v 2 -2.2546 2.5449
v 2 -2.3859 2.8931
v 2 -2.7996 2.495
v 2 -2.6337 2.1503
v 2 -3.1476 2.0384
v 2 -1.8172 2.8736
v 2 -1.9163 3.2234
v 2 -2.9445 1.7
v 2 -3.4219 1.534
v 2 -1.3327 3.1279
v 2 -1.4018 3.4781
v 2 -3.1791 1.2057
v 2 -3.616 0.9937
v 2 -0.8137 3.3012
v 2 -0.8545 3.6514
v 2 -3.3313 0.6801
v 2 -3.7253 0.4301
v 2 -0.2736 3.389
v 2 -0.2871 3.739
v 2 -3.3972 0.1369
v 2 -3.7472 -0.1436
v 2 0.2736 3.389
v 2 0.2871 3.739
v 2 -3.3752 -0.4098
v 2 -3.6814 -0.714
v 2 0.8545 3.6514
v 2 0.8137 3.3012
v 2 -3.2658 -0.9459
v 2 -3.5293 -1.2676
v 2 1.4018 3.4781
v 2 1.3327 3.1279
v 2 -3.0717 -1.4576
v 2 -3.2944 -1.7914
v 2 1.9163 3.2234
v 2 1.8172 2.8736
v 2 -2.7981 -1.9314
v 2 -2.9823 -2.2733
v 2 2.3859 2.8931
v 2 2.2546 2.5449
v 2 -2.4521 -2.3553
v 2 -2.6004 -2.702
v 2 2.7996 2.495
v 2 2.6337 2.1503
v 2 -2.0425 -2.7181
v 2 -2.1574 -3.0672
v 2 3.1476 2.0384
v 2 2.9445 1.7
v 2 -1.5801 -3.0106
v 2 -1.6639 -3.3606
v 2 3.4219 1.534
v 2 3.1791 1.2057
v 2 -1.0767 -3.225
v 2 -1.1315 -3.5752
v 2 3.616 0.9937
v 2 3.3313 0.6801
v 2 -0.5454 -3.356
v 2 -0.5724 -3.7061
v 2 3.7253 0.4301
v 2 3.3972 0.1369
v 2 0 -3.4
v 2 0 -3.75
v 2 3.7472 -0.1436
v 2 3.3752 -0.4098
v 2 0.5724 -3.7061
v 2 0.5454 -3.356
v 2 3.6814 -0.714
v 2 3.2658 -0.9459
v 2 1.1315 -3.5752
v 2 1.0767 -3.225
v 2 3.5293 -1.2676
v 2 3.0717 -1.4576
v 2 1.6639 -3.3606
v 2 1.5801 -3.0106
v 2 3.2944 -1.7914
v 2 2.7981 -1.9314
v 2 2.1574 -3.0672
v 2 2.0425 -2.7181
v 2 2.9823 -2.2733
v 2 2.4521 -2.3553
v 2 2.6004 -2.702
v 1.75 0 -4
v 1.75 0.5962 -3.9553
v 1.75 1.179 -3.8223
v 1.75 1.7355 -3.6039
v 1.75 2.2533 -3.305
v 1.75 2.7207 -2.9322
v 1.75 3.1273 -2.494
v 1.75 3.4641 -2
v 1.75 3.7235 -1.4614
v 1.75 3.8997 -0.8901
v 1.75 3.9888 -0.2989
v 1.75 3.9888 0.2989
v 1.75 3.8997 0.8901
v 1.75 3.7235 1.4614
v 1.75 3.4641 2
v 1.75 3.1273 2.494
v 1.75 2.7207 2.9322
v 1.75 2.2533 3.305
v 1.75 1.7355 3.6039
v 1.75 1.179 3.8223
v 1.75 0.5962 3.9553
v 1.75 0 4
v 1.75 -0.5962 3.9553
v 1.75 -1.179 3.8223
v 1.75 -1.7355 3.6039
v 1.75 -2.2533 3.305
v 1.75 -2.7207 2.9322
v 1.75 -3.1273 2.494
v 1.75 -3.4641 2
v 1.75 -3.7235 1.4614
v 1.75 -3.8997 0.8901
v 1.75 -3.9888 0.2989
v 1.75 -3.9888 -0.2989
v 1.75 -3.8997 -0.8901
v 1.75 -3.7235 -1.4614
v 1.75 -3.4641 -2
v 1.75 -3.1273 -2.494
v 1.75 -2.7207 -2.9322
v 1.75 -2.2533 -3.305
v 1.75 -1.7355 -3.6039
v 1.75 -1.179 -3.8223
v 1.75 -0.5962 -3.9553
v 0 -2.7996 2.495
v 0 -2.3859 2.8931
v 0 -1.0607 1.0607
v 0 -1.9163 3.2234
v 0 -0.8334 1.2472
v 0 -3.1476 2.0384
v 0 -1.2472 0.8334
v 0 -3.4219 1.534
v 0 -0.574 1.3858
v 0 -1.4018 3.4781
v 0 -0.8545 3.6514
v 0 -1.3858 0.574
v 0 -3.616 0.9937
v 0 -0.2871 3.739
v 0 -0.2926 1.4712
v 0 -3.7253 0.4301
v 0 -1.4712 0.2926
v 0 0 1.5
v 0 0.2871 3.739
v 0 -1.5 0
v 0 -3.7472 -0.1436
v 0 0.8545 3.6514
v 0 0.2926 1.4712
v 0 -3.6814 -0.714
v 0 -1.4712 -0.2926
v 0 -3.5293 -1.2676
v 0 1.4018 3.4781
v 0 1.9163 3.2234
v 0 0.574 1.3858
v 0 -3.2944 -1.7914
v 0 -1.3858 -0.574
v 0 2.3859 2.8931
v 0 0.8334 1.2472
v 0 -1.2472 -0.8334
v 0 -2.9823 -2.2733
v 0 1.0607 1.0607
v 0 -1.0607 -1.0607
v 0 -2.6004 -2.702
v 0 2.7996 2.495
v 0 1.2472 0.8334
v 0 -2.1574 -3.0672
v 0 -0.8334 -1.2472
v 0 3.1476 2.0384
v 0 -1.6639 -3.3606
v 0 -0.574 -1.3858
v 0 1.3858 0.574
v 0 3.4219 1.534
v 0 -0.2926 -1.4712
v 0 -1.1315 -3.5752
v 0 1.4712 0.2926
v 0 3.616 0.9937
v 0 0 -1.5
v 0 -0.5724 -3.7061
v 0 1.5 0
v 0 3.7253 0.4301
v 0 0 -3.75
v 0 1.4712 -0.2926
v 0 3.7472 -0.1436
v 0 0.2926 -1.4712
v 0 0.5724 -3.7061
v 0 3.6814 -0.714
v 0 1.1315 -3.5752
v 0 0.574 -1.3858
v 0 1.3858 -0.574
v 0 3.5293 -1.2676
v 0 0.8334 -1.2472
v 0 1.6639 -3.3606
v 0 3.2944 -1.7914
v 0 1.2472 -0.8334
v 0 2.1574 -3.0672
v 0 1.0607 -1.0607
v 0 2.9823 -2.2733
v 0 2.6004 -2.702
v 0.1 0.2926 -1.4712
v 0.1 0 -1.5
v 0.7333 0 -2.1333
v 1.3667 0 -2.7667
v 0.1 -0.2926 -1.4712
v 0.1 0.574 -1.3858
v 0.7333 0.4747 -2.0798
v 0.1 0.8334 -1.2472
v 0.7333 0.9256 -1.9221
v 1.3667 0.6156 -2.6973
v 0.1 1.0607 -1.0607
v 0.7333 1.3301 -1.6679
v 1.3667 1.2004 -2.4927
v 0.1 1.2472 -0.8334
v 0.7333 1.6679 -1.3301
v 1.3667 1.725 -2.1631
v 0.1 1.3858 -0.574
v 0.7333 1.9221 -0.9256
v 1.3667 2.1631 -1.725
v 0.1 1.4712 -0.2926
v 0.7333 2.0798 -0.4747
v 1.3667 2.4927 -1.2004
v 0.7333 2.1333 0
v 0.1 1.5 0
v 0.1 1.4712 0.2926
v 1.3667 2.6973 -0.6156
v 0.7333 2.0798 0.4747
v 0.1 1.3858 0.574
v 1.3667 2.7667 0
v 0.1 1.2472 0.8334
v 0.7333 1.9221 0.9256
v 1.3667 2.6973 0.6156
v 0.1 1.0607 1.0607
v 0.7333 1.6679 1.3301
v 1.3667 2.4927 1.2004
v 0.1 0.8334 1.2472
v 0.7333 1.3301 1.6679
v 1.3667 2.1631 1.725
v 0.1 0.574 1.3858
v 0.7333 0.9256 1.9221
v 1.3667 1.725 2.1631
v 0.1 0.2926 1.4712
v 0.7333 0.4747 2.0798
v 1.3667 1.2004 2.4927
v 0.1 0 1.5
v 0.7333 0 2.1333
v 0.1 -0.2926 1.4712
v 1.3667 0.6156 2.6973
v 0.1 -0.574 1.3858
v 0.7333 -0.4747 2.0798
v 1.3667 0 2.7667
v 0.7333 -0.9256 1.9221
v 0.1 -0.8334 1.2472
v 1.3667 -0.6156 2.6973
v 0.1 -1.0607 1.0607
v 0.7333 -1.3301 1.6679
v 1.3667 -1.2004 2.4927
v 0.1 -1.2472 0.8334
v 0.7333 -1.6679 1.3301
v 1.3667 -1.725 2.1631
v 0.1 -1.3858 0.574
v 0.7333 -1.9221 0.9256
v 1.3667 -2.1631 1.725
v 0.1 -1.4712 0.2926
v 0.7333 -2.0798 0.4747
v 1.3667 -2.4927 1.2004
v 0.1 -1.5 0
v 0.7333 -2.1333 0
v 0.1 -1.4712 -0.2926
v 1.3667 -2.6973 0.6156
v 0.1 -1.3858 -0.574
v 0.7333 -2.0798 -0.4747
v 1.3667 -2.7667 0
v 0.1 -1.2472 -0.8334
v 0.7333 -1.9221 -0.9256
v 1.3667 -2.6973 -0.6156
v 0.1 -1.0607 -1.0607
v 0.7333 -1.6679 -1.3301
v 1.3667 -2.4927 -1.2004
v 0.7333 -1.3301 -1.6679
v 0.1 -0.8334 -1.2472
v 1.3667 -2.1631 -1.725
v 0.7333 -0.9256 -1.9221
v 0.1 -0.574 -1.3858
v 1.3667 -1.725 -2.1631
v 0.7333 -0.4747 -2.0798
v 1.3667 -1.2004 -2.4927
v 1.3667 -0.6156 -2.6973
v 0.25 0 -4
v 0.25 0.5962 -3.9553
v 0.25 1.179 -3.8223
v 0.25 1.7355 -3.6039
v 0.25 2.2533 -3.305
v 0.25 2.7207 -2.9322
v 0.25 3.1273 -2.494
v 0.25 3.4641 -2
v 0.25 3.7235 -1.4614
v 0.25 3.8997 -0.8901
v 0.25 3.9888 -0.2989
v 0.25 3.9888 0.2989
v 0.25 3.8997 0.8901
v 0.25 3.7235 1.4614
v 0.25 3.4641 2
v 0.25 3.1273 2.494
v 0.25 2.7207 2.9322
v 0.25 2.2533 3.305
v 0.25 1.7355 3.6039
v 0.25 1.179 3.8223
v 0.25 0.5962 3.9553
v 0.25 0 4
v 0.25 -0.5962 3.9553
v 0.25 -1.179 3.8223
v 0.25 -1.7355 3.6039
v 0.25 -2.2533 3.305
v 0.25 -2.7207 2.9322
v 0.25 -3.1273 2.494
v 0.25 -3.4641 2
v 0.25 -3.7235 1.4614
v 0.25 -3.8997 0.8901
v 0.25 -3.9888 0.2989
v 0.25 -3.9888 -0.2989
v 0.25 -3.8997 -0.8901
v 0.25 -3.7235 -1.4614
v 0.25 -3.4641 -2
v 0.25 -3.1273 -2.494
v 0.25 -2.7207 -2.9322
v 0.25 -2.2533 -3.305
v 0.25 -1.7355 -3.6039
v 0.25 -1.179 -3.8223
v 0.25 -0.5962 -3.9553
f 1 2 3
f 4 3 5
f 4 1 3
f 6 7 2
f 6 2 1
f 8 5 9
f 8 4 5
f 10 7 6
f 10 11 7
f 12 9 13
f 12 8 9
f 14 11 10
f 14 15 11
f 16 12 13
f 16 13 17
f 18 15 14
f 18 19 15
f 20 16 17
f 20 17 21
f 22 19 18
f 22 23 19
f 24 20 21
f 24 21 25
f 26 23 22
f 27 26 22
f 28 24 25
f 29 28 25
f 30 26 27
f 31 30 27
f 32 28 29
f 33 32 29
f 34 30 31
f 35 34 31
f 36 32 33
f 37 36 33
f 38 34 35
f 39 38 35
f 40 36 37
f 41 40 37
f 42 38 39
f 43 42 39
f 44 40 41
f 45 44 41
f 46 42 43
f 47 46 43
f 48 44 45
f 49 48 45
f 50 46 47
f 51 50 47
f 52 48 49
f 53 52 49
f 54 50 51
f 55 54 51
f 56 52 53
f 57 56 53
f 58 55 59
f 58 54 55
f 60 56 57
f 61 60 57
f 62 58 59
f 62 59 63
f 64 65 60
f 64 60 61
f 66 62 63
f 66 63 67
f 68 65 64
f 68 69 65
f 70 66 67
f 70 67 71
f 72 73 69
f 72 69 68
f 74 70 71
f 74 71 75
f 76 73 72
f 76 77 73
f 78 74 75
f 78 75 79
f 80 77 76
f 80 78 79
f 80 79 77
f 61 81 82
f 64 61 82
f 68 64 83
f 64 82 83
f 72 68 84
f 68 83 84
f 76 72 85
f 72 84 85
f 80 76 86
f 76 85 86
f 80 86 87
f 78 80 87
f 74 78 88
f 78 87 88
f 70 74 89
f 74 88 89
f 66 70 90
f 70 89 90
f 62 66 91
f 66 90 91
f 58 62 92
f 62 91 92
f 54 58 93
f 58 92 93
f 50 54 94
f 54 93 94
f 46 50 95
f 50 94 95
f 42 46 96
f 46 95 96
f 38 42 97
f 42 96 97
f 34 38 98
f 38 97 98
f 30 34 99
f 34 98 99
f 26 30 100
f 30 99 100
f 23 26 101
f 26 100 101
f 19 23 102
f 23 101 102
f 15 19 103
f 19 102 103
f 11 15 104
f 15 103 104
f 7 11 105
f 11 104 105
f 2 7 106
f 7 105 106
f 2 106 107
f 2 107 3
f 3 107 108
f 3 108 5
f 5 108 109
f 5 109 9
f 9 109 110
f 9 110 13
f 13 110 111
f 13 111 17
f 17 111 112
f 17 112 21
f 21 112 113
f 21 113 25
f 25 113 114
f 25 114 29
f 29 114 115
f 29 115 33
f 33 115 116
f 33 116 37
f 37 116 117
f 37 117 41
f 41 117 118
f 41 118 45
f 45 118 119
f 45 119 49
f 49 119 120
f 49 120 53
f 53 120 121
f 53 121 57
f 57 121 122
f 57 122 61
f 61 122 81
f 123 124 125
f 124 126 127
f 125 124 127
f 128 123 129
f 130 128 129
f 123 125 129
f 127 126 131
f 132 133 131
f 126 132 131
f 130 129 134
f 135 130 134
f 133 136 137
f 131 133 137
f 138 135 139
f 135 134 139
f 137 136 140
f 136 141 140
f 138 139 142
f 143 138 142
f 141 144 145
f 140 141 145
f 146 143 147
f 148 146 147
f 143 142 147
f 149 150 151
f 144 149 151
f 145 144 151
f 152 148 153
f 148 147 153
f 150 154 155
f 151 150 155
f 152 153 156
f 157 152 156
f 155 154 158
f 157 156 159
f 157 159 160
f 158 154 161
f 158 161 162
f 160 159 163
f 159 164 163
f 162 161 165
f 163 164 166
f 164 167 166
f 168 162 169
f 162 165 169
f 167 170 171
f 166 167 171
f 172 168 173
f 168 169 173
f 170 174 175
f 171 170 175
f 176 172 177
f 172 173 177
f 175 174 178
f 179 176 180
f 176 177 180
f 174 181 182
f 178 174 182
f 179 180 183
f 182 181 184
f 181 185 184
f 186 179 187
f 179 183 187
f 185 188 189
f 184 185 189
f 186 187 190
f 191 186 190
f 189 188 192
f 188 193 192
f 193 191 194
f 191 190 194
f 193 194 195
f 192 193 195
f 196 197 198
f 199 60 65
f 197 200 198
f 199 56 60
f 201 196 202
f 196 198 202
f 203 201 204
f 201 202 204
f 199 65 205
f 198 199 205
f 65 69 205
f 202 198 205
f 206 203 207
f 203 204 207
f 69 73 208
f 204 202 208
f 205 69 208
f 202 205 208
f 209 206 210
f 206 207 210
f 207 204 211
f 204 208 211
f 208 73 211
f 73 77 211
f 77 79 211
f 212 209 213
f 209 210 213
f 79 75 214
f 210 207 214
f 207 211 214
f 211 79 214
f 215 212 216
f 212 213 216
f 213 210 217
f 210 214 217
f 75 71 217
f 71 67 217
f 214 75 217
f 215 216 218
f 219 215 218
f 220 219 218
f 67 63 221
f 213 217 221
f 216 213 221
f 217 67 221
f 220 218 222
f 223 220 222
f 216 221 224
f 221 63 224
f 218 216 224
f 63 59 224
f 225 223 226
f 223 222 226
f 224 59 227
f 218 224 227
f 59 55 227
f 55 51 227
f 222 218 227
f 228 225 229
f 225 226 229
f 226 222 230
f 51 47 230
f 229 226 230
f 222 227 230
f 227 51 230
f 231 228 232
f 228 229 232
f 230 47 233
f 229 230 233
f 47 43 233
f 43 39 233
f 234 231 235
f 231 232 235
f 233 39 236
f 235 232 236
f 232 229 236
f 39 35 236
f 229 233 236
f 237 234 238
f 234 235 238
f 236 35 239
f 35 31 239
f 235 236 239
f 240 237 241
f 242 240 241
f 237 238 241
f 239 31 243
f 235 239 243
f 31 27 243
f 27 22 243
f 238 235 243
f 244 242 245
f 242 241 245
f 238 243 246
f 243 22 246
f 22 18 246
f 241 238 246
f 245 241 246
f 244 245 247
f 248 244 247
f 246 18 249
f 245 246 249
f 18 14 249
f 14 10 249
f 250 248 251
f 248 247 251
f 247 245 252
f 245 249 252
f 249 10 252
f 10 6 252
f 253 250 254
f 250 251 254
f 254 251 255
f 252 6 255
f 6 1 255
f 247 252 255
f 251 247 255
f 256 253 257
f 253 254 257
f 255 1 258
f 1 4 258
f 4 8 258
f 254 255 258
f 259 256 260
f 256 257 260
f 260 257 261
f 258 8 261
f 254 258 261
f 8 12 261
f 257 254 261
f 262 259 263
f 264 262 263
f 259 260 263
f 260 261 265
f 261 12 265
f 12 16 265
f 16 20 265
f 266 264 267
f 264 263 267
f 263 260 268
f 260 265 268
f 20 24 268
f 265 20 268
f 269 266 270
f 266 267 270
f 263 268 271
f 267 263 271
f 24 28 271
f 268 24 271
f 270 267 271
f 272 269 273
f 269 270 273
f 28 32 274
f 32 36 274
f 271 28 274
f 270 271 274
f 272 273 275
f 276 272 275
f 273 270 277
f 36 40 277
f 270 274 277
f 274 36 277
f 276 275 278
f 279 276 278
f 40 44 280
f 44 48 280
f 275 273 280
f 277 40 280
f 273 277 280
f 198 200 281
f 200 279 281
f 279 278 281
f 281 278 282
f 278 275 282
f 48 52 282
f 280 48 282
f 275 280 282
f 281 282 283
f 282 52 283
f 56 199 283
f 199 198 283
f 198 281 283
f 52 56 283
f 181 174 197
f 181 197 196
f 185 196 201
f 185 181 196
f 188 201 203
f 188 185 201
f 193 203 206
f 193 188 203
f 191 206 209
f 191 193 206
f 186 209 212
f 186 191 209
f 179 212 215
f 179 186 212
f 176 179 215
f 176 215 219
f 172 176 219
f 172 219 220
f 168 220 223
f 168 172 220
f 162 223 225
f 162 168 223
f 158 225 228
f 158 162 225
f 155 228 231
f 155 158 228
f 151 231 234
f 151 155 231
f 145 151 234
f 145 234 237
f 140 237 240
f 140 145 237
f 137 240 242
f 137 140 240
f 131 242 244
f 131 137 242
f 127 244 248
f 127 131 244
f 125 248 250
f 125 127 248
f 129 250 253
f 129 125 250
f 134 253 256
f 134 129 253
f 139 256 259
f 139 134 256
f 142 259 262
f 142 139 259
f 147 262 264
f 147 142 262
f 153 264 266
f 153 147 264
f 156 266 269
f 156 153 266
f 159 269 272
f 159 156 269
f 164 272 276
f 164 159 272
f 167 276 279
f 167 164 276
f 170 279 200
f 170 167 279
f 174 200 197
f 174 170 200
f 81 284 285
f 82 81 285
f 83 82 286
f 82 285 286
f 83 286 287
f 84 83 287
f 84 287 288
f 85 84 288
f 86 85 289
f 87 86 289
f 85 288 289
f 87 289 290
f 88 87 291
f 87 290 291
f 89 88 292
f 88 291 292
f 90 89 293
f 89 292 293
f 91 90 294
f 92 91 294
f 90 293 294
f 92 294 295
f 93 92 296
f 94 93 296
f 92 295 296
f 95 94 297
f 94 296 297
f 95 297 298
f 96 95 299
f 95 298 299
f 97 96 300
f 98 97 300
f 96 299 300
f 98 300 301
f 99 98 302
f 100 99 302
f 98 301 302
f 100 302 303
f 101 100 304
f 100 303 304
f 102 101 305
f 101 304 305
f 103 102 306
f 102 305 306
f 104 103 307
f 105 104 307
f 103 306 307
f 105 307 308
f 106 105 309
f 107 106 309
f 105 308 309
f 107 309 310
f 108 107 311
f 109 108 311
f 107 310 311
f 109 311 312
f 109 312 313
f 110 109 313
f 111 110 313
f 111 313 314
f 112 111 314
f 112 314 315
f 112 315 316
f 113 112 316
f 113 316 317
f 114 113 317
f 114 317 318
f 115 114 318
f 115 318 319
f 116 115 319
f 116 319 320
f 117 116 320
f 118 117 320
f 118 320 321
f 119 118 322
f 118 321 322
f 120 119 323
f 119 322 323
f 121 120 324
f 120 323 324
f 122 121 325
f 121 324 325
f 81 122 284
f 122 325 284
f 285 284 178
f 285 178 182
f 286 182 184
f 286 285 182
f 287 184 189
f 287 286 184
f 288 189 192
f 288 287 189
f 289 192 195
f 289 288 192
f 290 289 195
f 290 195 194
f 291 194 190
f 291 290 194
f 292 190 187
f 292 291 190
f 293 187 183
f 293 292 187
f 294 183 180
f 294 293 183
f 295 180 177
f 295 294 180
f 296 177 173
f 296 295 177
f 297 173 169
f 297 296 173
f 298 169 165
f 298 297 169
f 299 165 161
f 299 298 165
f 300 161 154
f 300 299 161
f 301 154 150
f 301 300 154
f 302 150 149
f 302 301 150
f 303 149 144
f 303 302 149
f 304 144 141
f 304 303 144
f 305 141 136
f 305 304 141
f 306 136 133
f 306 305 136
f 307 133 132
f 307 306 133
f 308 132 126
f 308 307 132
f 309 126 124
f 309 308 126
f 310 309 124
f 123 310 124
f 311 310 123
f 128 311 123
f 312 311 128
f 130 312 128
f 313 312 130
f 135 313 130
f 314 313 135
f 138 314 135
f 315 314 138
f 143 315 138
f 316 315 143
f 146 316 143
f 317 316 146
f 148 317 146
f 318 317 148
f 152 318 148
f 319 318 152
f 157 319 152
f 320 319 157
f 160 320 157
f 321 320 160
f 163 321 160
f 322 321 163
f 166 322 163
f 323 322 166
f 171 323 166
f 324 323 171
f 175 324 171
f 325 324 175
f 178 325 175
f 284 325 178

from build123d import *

# Parameters (mm, degrees)
SKETCH1_R           = 4
SKETCH1_R_2         = 1.5
BOSS_EXTRUDE1_DEPTH = 2
CHAMFER1_SIZE       = 1.9
CHAMFER2_SIZE       = 0.25


with BuildPart() as part:
    # Sketch1 → Boss-Extrude1 (new body)
    with BuildSketch(Plane(origin=(0, 0, 0), x_dir=(0, 0, -1), z_dir=(1, 0, 0))):
        Circle(SKETCH1_R)
        Circle(SKETCH1_R_2, mode=Mode.SUBTRACT)
    extrude(amount=BOSS_EXTRUDE1_DEPTH)

    # Chamfer1
    chamfer1_edges = [part.edges().sort_by_distance(p)[0] for p in [
        (2, 0, 1.5),
    ]]
    chamfer(chamfer1_edges, length=CHAMFER1_SIZE)

    # Chamfer2
    chamfer2_edges = [part.edges().sort_by_distance(p)[0] for p in [
        (0, 0, 4),
        (2, 0, 4),
    ]]
    chamfer(chamfer2_edges, length=CHAMFER2_SIZE)


solid = part.part
